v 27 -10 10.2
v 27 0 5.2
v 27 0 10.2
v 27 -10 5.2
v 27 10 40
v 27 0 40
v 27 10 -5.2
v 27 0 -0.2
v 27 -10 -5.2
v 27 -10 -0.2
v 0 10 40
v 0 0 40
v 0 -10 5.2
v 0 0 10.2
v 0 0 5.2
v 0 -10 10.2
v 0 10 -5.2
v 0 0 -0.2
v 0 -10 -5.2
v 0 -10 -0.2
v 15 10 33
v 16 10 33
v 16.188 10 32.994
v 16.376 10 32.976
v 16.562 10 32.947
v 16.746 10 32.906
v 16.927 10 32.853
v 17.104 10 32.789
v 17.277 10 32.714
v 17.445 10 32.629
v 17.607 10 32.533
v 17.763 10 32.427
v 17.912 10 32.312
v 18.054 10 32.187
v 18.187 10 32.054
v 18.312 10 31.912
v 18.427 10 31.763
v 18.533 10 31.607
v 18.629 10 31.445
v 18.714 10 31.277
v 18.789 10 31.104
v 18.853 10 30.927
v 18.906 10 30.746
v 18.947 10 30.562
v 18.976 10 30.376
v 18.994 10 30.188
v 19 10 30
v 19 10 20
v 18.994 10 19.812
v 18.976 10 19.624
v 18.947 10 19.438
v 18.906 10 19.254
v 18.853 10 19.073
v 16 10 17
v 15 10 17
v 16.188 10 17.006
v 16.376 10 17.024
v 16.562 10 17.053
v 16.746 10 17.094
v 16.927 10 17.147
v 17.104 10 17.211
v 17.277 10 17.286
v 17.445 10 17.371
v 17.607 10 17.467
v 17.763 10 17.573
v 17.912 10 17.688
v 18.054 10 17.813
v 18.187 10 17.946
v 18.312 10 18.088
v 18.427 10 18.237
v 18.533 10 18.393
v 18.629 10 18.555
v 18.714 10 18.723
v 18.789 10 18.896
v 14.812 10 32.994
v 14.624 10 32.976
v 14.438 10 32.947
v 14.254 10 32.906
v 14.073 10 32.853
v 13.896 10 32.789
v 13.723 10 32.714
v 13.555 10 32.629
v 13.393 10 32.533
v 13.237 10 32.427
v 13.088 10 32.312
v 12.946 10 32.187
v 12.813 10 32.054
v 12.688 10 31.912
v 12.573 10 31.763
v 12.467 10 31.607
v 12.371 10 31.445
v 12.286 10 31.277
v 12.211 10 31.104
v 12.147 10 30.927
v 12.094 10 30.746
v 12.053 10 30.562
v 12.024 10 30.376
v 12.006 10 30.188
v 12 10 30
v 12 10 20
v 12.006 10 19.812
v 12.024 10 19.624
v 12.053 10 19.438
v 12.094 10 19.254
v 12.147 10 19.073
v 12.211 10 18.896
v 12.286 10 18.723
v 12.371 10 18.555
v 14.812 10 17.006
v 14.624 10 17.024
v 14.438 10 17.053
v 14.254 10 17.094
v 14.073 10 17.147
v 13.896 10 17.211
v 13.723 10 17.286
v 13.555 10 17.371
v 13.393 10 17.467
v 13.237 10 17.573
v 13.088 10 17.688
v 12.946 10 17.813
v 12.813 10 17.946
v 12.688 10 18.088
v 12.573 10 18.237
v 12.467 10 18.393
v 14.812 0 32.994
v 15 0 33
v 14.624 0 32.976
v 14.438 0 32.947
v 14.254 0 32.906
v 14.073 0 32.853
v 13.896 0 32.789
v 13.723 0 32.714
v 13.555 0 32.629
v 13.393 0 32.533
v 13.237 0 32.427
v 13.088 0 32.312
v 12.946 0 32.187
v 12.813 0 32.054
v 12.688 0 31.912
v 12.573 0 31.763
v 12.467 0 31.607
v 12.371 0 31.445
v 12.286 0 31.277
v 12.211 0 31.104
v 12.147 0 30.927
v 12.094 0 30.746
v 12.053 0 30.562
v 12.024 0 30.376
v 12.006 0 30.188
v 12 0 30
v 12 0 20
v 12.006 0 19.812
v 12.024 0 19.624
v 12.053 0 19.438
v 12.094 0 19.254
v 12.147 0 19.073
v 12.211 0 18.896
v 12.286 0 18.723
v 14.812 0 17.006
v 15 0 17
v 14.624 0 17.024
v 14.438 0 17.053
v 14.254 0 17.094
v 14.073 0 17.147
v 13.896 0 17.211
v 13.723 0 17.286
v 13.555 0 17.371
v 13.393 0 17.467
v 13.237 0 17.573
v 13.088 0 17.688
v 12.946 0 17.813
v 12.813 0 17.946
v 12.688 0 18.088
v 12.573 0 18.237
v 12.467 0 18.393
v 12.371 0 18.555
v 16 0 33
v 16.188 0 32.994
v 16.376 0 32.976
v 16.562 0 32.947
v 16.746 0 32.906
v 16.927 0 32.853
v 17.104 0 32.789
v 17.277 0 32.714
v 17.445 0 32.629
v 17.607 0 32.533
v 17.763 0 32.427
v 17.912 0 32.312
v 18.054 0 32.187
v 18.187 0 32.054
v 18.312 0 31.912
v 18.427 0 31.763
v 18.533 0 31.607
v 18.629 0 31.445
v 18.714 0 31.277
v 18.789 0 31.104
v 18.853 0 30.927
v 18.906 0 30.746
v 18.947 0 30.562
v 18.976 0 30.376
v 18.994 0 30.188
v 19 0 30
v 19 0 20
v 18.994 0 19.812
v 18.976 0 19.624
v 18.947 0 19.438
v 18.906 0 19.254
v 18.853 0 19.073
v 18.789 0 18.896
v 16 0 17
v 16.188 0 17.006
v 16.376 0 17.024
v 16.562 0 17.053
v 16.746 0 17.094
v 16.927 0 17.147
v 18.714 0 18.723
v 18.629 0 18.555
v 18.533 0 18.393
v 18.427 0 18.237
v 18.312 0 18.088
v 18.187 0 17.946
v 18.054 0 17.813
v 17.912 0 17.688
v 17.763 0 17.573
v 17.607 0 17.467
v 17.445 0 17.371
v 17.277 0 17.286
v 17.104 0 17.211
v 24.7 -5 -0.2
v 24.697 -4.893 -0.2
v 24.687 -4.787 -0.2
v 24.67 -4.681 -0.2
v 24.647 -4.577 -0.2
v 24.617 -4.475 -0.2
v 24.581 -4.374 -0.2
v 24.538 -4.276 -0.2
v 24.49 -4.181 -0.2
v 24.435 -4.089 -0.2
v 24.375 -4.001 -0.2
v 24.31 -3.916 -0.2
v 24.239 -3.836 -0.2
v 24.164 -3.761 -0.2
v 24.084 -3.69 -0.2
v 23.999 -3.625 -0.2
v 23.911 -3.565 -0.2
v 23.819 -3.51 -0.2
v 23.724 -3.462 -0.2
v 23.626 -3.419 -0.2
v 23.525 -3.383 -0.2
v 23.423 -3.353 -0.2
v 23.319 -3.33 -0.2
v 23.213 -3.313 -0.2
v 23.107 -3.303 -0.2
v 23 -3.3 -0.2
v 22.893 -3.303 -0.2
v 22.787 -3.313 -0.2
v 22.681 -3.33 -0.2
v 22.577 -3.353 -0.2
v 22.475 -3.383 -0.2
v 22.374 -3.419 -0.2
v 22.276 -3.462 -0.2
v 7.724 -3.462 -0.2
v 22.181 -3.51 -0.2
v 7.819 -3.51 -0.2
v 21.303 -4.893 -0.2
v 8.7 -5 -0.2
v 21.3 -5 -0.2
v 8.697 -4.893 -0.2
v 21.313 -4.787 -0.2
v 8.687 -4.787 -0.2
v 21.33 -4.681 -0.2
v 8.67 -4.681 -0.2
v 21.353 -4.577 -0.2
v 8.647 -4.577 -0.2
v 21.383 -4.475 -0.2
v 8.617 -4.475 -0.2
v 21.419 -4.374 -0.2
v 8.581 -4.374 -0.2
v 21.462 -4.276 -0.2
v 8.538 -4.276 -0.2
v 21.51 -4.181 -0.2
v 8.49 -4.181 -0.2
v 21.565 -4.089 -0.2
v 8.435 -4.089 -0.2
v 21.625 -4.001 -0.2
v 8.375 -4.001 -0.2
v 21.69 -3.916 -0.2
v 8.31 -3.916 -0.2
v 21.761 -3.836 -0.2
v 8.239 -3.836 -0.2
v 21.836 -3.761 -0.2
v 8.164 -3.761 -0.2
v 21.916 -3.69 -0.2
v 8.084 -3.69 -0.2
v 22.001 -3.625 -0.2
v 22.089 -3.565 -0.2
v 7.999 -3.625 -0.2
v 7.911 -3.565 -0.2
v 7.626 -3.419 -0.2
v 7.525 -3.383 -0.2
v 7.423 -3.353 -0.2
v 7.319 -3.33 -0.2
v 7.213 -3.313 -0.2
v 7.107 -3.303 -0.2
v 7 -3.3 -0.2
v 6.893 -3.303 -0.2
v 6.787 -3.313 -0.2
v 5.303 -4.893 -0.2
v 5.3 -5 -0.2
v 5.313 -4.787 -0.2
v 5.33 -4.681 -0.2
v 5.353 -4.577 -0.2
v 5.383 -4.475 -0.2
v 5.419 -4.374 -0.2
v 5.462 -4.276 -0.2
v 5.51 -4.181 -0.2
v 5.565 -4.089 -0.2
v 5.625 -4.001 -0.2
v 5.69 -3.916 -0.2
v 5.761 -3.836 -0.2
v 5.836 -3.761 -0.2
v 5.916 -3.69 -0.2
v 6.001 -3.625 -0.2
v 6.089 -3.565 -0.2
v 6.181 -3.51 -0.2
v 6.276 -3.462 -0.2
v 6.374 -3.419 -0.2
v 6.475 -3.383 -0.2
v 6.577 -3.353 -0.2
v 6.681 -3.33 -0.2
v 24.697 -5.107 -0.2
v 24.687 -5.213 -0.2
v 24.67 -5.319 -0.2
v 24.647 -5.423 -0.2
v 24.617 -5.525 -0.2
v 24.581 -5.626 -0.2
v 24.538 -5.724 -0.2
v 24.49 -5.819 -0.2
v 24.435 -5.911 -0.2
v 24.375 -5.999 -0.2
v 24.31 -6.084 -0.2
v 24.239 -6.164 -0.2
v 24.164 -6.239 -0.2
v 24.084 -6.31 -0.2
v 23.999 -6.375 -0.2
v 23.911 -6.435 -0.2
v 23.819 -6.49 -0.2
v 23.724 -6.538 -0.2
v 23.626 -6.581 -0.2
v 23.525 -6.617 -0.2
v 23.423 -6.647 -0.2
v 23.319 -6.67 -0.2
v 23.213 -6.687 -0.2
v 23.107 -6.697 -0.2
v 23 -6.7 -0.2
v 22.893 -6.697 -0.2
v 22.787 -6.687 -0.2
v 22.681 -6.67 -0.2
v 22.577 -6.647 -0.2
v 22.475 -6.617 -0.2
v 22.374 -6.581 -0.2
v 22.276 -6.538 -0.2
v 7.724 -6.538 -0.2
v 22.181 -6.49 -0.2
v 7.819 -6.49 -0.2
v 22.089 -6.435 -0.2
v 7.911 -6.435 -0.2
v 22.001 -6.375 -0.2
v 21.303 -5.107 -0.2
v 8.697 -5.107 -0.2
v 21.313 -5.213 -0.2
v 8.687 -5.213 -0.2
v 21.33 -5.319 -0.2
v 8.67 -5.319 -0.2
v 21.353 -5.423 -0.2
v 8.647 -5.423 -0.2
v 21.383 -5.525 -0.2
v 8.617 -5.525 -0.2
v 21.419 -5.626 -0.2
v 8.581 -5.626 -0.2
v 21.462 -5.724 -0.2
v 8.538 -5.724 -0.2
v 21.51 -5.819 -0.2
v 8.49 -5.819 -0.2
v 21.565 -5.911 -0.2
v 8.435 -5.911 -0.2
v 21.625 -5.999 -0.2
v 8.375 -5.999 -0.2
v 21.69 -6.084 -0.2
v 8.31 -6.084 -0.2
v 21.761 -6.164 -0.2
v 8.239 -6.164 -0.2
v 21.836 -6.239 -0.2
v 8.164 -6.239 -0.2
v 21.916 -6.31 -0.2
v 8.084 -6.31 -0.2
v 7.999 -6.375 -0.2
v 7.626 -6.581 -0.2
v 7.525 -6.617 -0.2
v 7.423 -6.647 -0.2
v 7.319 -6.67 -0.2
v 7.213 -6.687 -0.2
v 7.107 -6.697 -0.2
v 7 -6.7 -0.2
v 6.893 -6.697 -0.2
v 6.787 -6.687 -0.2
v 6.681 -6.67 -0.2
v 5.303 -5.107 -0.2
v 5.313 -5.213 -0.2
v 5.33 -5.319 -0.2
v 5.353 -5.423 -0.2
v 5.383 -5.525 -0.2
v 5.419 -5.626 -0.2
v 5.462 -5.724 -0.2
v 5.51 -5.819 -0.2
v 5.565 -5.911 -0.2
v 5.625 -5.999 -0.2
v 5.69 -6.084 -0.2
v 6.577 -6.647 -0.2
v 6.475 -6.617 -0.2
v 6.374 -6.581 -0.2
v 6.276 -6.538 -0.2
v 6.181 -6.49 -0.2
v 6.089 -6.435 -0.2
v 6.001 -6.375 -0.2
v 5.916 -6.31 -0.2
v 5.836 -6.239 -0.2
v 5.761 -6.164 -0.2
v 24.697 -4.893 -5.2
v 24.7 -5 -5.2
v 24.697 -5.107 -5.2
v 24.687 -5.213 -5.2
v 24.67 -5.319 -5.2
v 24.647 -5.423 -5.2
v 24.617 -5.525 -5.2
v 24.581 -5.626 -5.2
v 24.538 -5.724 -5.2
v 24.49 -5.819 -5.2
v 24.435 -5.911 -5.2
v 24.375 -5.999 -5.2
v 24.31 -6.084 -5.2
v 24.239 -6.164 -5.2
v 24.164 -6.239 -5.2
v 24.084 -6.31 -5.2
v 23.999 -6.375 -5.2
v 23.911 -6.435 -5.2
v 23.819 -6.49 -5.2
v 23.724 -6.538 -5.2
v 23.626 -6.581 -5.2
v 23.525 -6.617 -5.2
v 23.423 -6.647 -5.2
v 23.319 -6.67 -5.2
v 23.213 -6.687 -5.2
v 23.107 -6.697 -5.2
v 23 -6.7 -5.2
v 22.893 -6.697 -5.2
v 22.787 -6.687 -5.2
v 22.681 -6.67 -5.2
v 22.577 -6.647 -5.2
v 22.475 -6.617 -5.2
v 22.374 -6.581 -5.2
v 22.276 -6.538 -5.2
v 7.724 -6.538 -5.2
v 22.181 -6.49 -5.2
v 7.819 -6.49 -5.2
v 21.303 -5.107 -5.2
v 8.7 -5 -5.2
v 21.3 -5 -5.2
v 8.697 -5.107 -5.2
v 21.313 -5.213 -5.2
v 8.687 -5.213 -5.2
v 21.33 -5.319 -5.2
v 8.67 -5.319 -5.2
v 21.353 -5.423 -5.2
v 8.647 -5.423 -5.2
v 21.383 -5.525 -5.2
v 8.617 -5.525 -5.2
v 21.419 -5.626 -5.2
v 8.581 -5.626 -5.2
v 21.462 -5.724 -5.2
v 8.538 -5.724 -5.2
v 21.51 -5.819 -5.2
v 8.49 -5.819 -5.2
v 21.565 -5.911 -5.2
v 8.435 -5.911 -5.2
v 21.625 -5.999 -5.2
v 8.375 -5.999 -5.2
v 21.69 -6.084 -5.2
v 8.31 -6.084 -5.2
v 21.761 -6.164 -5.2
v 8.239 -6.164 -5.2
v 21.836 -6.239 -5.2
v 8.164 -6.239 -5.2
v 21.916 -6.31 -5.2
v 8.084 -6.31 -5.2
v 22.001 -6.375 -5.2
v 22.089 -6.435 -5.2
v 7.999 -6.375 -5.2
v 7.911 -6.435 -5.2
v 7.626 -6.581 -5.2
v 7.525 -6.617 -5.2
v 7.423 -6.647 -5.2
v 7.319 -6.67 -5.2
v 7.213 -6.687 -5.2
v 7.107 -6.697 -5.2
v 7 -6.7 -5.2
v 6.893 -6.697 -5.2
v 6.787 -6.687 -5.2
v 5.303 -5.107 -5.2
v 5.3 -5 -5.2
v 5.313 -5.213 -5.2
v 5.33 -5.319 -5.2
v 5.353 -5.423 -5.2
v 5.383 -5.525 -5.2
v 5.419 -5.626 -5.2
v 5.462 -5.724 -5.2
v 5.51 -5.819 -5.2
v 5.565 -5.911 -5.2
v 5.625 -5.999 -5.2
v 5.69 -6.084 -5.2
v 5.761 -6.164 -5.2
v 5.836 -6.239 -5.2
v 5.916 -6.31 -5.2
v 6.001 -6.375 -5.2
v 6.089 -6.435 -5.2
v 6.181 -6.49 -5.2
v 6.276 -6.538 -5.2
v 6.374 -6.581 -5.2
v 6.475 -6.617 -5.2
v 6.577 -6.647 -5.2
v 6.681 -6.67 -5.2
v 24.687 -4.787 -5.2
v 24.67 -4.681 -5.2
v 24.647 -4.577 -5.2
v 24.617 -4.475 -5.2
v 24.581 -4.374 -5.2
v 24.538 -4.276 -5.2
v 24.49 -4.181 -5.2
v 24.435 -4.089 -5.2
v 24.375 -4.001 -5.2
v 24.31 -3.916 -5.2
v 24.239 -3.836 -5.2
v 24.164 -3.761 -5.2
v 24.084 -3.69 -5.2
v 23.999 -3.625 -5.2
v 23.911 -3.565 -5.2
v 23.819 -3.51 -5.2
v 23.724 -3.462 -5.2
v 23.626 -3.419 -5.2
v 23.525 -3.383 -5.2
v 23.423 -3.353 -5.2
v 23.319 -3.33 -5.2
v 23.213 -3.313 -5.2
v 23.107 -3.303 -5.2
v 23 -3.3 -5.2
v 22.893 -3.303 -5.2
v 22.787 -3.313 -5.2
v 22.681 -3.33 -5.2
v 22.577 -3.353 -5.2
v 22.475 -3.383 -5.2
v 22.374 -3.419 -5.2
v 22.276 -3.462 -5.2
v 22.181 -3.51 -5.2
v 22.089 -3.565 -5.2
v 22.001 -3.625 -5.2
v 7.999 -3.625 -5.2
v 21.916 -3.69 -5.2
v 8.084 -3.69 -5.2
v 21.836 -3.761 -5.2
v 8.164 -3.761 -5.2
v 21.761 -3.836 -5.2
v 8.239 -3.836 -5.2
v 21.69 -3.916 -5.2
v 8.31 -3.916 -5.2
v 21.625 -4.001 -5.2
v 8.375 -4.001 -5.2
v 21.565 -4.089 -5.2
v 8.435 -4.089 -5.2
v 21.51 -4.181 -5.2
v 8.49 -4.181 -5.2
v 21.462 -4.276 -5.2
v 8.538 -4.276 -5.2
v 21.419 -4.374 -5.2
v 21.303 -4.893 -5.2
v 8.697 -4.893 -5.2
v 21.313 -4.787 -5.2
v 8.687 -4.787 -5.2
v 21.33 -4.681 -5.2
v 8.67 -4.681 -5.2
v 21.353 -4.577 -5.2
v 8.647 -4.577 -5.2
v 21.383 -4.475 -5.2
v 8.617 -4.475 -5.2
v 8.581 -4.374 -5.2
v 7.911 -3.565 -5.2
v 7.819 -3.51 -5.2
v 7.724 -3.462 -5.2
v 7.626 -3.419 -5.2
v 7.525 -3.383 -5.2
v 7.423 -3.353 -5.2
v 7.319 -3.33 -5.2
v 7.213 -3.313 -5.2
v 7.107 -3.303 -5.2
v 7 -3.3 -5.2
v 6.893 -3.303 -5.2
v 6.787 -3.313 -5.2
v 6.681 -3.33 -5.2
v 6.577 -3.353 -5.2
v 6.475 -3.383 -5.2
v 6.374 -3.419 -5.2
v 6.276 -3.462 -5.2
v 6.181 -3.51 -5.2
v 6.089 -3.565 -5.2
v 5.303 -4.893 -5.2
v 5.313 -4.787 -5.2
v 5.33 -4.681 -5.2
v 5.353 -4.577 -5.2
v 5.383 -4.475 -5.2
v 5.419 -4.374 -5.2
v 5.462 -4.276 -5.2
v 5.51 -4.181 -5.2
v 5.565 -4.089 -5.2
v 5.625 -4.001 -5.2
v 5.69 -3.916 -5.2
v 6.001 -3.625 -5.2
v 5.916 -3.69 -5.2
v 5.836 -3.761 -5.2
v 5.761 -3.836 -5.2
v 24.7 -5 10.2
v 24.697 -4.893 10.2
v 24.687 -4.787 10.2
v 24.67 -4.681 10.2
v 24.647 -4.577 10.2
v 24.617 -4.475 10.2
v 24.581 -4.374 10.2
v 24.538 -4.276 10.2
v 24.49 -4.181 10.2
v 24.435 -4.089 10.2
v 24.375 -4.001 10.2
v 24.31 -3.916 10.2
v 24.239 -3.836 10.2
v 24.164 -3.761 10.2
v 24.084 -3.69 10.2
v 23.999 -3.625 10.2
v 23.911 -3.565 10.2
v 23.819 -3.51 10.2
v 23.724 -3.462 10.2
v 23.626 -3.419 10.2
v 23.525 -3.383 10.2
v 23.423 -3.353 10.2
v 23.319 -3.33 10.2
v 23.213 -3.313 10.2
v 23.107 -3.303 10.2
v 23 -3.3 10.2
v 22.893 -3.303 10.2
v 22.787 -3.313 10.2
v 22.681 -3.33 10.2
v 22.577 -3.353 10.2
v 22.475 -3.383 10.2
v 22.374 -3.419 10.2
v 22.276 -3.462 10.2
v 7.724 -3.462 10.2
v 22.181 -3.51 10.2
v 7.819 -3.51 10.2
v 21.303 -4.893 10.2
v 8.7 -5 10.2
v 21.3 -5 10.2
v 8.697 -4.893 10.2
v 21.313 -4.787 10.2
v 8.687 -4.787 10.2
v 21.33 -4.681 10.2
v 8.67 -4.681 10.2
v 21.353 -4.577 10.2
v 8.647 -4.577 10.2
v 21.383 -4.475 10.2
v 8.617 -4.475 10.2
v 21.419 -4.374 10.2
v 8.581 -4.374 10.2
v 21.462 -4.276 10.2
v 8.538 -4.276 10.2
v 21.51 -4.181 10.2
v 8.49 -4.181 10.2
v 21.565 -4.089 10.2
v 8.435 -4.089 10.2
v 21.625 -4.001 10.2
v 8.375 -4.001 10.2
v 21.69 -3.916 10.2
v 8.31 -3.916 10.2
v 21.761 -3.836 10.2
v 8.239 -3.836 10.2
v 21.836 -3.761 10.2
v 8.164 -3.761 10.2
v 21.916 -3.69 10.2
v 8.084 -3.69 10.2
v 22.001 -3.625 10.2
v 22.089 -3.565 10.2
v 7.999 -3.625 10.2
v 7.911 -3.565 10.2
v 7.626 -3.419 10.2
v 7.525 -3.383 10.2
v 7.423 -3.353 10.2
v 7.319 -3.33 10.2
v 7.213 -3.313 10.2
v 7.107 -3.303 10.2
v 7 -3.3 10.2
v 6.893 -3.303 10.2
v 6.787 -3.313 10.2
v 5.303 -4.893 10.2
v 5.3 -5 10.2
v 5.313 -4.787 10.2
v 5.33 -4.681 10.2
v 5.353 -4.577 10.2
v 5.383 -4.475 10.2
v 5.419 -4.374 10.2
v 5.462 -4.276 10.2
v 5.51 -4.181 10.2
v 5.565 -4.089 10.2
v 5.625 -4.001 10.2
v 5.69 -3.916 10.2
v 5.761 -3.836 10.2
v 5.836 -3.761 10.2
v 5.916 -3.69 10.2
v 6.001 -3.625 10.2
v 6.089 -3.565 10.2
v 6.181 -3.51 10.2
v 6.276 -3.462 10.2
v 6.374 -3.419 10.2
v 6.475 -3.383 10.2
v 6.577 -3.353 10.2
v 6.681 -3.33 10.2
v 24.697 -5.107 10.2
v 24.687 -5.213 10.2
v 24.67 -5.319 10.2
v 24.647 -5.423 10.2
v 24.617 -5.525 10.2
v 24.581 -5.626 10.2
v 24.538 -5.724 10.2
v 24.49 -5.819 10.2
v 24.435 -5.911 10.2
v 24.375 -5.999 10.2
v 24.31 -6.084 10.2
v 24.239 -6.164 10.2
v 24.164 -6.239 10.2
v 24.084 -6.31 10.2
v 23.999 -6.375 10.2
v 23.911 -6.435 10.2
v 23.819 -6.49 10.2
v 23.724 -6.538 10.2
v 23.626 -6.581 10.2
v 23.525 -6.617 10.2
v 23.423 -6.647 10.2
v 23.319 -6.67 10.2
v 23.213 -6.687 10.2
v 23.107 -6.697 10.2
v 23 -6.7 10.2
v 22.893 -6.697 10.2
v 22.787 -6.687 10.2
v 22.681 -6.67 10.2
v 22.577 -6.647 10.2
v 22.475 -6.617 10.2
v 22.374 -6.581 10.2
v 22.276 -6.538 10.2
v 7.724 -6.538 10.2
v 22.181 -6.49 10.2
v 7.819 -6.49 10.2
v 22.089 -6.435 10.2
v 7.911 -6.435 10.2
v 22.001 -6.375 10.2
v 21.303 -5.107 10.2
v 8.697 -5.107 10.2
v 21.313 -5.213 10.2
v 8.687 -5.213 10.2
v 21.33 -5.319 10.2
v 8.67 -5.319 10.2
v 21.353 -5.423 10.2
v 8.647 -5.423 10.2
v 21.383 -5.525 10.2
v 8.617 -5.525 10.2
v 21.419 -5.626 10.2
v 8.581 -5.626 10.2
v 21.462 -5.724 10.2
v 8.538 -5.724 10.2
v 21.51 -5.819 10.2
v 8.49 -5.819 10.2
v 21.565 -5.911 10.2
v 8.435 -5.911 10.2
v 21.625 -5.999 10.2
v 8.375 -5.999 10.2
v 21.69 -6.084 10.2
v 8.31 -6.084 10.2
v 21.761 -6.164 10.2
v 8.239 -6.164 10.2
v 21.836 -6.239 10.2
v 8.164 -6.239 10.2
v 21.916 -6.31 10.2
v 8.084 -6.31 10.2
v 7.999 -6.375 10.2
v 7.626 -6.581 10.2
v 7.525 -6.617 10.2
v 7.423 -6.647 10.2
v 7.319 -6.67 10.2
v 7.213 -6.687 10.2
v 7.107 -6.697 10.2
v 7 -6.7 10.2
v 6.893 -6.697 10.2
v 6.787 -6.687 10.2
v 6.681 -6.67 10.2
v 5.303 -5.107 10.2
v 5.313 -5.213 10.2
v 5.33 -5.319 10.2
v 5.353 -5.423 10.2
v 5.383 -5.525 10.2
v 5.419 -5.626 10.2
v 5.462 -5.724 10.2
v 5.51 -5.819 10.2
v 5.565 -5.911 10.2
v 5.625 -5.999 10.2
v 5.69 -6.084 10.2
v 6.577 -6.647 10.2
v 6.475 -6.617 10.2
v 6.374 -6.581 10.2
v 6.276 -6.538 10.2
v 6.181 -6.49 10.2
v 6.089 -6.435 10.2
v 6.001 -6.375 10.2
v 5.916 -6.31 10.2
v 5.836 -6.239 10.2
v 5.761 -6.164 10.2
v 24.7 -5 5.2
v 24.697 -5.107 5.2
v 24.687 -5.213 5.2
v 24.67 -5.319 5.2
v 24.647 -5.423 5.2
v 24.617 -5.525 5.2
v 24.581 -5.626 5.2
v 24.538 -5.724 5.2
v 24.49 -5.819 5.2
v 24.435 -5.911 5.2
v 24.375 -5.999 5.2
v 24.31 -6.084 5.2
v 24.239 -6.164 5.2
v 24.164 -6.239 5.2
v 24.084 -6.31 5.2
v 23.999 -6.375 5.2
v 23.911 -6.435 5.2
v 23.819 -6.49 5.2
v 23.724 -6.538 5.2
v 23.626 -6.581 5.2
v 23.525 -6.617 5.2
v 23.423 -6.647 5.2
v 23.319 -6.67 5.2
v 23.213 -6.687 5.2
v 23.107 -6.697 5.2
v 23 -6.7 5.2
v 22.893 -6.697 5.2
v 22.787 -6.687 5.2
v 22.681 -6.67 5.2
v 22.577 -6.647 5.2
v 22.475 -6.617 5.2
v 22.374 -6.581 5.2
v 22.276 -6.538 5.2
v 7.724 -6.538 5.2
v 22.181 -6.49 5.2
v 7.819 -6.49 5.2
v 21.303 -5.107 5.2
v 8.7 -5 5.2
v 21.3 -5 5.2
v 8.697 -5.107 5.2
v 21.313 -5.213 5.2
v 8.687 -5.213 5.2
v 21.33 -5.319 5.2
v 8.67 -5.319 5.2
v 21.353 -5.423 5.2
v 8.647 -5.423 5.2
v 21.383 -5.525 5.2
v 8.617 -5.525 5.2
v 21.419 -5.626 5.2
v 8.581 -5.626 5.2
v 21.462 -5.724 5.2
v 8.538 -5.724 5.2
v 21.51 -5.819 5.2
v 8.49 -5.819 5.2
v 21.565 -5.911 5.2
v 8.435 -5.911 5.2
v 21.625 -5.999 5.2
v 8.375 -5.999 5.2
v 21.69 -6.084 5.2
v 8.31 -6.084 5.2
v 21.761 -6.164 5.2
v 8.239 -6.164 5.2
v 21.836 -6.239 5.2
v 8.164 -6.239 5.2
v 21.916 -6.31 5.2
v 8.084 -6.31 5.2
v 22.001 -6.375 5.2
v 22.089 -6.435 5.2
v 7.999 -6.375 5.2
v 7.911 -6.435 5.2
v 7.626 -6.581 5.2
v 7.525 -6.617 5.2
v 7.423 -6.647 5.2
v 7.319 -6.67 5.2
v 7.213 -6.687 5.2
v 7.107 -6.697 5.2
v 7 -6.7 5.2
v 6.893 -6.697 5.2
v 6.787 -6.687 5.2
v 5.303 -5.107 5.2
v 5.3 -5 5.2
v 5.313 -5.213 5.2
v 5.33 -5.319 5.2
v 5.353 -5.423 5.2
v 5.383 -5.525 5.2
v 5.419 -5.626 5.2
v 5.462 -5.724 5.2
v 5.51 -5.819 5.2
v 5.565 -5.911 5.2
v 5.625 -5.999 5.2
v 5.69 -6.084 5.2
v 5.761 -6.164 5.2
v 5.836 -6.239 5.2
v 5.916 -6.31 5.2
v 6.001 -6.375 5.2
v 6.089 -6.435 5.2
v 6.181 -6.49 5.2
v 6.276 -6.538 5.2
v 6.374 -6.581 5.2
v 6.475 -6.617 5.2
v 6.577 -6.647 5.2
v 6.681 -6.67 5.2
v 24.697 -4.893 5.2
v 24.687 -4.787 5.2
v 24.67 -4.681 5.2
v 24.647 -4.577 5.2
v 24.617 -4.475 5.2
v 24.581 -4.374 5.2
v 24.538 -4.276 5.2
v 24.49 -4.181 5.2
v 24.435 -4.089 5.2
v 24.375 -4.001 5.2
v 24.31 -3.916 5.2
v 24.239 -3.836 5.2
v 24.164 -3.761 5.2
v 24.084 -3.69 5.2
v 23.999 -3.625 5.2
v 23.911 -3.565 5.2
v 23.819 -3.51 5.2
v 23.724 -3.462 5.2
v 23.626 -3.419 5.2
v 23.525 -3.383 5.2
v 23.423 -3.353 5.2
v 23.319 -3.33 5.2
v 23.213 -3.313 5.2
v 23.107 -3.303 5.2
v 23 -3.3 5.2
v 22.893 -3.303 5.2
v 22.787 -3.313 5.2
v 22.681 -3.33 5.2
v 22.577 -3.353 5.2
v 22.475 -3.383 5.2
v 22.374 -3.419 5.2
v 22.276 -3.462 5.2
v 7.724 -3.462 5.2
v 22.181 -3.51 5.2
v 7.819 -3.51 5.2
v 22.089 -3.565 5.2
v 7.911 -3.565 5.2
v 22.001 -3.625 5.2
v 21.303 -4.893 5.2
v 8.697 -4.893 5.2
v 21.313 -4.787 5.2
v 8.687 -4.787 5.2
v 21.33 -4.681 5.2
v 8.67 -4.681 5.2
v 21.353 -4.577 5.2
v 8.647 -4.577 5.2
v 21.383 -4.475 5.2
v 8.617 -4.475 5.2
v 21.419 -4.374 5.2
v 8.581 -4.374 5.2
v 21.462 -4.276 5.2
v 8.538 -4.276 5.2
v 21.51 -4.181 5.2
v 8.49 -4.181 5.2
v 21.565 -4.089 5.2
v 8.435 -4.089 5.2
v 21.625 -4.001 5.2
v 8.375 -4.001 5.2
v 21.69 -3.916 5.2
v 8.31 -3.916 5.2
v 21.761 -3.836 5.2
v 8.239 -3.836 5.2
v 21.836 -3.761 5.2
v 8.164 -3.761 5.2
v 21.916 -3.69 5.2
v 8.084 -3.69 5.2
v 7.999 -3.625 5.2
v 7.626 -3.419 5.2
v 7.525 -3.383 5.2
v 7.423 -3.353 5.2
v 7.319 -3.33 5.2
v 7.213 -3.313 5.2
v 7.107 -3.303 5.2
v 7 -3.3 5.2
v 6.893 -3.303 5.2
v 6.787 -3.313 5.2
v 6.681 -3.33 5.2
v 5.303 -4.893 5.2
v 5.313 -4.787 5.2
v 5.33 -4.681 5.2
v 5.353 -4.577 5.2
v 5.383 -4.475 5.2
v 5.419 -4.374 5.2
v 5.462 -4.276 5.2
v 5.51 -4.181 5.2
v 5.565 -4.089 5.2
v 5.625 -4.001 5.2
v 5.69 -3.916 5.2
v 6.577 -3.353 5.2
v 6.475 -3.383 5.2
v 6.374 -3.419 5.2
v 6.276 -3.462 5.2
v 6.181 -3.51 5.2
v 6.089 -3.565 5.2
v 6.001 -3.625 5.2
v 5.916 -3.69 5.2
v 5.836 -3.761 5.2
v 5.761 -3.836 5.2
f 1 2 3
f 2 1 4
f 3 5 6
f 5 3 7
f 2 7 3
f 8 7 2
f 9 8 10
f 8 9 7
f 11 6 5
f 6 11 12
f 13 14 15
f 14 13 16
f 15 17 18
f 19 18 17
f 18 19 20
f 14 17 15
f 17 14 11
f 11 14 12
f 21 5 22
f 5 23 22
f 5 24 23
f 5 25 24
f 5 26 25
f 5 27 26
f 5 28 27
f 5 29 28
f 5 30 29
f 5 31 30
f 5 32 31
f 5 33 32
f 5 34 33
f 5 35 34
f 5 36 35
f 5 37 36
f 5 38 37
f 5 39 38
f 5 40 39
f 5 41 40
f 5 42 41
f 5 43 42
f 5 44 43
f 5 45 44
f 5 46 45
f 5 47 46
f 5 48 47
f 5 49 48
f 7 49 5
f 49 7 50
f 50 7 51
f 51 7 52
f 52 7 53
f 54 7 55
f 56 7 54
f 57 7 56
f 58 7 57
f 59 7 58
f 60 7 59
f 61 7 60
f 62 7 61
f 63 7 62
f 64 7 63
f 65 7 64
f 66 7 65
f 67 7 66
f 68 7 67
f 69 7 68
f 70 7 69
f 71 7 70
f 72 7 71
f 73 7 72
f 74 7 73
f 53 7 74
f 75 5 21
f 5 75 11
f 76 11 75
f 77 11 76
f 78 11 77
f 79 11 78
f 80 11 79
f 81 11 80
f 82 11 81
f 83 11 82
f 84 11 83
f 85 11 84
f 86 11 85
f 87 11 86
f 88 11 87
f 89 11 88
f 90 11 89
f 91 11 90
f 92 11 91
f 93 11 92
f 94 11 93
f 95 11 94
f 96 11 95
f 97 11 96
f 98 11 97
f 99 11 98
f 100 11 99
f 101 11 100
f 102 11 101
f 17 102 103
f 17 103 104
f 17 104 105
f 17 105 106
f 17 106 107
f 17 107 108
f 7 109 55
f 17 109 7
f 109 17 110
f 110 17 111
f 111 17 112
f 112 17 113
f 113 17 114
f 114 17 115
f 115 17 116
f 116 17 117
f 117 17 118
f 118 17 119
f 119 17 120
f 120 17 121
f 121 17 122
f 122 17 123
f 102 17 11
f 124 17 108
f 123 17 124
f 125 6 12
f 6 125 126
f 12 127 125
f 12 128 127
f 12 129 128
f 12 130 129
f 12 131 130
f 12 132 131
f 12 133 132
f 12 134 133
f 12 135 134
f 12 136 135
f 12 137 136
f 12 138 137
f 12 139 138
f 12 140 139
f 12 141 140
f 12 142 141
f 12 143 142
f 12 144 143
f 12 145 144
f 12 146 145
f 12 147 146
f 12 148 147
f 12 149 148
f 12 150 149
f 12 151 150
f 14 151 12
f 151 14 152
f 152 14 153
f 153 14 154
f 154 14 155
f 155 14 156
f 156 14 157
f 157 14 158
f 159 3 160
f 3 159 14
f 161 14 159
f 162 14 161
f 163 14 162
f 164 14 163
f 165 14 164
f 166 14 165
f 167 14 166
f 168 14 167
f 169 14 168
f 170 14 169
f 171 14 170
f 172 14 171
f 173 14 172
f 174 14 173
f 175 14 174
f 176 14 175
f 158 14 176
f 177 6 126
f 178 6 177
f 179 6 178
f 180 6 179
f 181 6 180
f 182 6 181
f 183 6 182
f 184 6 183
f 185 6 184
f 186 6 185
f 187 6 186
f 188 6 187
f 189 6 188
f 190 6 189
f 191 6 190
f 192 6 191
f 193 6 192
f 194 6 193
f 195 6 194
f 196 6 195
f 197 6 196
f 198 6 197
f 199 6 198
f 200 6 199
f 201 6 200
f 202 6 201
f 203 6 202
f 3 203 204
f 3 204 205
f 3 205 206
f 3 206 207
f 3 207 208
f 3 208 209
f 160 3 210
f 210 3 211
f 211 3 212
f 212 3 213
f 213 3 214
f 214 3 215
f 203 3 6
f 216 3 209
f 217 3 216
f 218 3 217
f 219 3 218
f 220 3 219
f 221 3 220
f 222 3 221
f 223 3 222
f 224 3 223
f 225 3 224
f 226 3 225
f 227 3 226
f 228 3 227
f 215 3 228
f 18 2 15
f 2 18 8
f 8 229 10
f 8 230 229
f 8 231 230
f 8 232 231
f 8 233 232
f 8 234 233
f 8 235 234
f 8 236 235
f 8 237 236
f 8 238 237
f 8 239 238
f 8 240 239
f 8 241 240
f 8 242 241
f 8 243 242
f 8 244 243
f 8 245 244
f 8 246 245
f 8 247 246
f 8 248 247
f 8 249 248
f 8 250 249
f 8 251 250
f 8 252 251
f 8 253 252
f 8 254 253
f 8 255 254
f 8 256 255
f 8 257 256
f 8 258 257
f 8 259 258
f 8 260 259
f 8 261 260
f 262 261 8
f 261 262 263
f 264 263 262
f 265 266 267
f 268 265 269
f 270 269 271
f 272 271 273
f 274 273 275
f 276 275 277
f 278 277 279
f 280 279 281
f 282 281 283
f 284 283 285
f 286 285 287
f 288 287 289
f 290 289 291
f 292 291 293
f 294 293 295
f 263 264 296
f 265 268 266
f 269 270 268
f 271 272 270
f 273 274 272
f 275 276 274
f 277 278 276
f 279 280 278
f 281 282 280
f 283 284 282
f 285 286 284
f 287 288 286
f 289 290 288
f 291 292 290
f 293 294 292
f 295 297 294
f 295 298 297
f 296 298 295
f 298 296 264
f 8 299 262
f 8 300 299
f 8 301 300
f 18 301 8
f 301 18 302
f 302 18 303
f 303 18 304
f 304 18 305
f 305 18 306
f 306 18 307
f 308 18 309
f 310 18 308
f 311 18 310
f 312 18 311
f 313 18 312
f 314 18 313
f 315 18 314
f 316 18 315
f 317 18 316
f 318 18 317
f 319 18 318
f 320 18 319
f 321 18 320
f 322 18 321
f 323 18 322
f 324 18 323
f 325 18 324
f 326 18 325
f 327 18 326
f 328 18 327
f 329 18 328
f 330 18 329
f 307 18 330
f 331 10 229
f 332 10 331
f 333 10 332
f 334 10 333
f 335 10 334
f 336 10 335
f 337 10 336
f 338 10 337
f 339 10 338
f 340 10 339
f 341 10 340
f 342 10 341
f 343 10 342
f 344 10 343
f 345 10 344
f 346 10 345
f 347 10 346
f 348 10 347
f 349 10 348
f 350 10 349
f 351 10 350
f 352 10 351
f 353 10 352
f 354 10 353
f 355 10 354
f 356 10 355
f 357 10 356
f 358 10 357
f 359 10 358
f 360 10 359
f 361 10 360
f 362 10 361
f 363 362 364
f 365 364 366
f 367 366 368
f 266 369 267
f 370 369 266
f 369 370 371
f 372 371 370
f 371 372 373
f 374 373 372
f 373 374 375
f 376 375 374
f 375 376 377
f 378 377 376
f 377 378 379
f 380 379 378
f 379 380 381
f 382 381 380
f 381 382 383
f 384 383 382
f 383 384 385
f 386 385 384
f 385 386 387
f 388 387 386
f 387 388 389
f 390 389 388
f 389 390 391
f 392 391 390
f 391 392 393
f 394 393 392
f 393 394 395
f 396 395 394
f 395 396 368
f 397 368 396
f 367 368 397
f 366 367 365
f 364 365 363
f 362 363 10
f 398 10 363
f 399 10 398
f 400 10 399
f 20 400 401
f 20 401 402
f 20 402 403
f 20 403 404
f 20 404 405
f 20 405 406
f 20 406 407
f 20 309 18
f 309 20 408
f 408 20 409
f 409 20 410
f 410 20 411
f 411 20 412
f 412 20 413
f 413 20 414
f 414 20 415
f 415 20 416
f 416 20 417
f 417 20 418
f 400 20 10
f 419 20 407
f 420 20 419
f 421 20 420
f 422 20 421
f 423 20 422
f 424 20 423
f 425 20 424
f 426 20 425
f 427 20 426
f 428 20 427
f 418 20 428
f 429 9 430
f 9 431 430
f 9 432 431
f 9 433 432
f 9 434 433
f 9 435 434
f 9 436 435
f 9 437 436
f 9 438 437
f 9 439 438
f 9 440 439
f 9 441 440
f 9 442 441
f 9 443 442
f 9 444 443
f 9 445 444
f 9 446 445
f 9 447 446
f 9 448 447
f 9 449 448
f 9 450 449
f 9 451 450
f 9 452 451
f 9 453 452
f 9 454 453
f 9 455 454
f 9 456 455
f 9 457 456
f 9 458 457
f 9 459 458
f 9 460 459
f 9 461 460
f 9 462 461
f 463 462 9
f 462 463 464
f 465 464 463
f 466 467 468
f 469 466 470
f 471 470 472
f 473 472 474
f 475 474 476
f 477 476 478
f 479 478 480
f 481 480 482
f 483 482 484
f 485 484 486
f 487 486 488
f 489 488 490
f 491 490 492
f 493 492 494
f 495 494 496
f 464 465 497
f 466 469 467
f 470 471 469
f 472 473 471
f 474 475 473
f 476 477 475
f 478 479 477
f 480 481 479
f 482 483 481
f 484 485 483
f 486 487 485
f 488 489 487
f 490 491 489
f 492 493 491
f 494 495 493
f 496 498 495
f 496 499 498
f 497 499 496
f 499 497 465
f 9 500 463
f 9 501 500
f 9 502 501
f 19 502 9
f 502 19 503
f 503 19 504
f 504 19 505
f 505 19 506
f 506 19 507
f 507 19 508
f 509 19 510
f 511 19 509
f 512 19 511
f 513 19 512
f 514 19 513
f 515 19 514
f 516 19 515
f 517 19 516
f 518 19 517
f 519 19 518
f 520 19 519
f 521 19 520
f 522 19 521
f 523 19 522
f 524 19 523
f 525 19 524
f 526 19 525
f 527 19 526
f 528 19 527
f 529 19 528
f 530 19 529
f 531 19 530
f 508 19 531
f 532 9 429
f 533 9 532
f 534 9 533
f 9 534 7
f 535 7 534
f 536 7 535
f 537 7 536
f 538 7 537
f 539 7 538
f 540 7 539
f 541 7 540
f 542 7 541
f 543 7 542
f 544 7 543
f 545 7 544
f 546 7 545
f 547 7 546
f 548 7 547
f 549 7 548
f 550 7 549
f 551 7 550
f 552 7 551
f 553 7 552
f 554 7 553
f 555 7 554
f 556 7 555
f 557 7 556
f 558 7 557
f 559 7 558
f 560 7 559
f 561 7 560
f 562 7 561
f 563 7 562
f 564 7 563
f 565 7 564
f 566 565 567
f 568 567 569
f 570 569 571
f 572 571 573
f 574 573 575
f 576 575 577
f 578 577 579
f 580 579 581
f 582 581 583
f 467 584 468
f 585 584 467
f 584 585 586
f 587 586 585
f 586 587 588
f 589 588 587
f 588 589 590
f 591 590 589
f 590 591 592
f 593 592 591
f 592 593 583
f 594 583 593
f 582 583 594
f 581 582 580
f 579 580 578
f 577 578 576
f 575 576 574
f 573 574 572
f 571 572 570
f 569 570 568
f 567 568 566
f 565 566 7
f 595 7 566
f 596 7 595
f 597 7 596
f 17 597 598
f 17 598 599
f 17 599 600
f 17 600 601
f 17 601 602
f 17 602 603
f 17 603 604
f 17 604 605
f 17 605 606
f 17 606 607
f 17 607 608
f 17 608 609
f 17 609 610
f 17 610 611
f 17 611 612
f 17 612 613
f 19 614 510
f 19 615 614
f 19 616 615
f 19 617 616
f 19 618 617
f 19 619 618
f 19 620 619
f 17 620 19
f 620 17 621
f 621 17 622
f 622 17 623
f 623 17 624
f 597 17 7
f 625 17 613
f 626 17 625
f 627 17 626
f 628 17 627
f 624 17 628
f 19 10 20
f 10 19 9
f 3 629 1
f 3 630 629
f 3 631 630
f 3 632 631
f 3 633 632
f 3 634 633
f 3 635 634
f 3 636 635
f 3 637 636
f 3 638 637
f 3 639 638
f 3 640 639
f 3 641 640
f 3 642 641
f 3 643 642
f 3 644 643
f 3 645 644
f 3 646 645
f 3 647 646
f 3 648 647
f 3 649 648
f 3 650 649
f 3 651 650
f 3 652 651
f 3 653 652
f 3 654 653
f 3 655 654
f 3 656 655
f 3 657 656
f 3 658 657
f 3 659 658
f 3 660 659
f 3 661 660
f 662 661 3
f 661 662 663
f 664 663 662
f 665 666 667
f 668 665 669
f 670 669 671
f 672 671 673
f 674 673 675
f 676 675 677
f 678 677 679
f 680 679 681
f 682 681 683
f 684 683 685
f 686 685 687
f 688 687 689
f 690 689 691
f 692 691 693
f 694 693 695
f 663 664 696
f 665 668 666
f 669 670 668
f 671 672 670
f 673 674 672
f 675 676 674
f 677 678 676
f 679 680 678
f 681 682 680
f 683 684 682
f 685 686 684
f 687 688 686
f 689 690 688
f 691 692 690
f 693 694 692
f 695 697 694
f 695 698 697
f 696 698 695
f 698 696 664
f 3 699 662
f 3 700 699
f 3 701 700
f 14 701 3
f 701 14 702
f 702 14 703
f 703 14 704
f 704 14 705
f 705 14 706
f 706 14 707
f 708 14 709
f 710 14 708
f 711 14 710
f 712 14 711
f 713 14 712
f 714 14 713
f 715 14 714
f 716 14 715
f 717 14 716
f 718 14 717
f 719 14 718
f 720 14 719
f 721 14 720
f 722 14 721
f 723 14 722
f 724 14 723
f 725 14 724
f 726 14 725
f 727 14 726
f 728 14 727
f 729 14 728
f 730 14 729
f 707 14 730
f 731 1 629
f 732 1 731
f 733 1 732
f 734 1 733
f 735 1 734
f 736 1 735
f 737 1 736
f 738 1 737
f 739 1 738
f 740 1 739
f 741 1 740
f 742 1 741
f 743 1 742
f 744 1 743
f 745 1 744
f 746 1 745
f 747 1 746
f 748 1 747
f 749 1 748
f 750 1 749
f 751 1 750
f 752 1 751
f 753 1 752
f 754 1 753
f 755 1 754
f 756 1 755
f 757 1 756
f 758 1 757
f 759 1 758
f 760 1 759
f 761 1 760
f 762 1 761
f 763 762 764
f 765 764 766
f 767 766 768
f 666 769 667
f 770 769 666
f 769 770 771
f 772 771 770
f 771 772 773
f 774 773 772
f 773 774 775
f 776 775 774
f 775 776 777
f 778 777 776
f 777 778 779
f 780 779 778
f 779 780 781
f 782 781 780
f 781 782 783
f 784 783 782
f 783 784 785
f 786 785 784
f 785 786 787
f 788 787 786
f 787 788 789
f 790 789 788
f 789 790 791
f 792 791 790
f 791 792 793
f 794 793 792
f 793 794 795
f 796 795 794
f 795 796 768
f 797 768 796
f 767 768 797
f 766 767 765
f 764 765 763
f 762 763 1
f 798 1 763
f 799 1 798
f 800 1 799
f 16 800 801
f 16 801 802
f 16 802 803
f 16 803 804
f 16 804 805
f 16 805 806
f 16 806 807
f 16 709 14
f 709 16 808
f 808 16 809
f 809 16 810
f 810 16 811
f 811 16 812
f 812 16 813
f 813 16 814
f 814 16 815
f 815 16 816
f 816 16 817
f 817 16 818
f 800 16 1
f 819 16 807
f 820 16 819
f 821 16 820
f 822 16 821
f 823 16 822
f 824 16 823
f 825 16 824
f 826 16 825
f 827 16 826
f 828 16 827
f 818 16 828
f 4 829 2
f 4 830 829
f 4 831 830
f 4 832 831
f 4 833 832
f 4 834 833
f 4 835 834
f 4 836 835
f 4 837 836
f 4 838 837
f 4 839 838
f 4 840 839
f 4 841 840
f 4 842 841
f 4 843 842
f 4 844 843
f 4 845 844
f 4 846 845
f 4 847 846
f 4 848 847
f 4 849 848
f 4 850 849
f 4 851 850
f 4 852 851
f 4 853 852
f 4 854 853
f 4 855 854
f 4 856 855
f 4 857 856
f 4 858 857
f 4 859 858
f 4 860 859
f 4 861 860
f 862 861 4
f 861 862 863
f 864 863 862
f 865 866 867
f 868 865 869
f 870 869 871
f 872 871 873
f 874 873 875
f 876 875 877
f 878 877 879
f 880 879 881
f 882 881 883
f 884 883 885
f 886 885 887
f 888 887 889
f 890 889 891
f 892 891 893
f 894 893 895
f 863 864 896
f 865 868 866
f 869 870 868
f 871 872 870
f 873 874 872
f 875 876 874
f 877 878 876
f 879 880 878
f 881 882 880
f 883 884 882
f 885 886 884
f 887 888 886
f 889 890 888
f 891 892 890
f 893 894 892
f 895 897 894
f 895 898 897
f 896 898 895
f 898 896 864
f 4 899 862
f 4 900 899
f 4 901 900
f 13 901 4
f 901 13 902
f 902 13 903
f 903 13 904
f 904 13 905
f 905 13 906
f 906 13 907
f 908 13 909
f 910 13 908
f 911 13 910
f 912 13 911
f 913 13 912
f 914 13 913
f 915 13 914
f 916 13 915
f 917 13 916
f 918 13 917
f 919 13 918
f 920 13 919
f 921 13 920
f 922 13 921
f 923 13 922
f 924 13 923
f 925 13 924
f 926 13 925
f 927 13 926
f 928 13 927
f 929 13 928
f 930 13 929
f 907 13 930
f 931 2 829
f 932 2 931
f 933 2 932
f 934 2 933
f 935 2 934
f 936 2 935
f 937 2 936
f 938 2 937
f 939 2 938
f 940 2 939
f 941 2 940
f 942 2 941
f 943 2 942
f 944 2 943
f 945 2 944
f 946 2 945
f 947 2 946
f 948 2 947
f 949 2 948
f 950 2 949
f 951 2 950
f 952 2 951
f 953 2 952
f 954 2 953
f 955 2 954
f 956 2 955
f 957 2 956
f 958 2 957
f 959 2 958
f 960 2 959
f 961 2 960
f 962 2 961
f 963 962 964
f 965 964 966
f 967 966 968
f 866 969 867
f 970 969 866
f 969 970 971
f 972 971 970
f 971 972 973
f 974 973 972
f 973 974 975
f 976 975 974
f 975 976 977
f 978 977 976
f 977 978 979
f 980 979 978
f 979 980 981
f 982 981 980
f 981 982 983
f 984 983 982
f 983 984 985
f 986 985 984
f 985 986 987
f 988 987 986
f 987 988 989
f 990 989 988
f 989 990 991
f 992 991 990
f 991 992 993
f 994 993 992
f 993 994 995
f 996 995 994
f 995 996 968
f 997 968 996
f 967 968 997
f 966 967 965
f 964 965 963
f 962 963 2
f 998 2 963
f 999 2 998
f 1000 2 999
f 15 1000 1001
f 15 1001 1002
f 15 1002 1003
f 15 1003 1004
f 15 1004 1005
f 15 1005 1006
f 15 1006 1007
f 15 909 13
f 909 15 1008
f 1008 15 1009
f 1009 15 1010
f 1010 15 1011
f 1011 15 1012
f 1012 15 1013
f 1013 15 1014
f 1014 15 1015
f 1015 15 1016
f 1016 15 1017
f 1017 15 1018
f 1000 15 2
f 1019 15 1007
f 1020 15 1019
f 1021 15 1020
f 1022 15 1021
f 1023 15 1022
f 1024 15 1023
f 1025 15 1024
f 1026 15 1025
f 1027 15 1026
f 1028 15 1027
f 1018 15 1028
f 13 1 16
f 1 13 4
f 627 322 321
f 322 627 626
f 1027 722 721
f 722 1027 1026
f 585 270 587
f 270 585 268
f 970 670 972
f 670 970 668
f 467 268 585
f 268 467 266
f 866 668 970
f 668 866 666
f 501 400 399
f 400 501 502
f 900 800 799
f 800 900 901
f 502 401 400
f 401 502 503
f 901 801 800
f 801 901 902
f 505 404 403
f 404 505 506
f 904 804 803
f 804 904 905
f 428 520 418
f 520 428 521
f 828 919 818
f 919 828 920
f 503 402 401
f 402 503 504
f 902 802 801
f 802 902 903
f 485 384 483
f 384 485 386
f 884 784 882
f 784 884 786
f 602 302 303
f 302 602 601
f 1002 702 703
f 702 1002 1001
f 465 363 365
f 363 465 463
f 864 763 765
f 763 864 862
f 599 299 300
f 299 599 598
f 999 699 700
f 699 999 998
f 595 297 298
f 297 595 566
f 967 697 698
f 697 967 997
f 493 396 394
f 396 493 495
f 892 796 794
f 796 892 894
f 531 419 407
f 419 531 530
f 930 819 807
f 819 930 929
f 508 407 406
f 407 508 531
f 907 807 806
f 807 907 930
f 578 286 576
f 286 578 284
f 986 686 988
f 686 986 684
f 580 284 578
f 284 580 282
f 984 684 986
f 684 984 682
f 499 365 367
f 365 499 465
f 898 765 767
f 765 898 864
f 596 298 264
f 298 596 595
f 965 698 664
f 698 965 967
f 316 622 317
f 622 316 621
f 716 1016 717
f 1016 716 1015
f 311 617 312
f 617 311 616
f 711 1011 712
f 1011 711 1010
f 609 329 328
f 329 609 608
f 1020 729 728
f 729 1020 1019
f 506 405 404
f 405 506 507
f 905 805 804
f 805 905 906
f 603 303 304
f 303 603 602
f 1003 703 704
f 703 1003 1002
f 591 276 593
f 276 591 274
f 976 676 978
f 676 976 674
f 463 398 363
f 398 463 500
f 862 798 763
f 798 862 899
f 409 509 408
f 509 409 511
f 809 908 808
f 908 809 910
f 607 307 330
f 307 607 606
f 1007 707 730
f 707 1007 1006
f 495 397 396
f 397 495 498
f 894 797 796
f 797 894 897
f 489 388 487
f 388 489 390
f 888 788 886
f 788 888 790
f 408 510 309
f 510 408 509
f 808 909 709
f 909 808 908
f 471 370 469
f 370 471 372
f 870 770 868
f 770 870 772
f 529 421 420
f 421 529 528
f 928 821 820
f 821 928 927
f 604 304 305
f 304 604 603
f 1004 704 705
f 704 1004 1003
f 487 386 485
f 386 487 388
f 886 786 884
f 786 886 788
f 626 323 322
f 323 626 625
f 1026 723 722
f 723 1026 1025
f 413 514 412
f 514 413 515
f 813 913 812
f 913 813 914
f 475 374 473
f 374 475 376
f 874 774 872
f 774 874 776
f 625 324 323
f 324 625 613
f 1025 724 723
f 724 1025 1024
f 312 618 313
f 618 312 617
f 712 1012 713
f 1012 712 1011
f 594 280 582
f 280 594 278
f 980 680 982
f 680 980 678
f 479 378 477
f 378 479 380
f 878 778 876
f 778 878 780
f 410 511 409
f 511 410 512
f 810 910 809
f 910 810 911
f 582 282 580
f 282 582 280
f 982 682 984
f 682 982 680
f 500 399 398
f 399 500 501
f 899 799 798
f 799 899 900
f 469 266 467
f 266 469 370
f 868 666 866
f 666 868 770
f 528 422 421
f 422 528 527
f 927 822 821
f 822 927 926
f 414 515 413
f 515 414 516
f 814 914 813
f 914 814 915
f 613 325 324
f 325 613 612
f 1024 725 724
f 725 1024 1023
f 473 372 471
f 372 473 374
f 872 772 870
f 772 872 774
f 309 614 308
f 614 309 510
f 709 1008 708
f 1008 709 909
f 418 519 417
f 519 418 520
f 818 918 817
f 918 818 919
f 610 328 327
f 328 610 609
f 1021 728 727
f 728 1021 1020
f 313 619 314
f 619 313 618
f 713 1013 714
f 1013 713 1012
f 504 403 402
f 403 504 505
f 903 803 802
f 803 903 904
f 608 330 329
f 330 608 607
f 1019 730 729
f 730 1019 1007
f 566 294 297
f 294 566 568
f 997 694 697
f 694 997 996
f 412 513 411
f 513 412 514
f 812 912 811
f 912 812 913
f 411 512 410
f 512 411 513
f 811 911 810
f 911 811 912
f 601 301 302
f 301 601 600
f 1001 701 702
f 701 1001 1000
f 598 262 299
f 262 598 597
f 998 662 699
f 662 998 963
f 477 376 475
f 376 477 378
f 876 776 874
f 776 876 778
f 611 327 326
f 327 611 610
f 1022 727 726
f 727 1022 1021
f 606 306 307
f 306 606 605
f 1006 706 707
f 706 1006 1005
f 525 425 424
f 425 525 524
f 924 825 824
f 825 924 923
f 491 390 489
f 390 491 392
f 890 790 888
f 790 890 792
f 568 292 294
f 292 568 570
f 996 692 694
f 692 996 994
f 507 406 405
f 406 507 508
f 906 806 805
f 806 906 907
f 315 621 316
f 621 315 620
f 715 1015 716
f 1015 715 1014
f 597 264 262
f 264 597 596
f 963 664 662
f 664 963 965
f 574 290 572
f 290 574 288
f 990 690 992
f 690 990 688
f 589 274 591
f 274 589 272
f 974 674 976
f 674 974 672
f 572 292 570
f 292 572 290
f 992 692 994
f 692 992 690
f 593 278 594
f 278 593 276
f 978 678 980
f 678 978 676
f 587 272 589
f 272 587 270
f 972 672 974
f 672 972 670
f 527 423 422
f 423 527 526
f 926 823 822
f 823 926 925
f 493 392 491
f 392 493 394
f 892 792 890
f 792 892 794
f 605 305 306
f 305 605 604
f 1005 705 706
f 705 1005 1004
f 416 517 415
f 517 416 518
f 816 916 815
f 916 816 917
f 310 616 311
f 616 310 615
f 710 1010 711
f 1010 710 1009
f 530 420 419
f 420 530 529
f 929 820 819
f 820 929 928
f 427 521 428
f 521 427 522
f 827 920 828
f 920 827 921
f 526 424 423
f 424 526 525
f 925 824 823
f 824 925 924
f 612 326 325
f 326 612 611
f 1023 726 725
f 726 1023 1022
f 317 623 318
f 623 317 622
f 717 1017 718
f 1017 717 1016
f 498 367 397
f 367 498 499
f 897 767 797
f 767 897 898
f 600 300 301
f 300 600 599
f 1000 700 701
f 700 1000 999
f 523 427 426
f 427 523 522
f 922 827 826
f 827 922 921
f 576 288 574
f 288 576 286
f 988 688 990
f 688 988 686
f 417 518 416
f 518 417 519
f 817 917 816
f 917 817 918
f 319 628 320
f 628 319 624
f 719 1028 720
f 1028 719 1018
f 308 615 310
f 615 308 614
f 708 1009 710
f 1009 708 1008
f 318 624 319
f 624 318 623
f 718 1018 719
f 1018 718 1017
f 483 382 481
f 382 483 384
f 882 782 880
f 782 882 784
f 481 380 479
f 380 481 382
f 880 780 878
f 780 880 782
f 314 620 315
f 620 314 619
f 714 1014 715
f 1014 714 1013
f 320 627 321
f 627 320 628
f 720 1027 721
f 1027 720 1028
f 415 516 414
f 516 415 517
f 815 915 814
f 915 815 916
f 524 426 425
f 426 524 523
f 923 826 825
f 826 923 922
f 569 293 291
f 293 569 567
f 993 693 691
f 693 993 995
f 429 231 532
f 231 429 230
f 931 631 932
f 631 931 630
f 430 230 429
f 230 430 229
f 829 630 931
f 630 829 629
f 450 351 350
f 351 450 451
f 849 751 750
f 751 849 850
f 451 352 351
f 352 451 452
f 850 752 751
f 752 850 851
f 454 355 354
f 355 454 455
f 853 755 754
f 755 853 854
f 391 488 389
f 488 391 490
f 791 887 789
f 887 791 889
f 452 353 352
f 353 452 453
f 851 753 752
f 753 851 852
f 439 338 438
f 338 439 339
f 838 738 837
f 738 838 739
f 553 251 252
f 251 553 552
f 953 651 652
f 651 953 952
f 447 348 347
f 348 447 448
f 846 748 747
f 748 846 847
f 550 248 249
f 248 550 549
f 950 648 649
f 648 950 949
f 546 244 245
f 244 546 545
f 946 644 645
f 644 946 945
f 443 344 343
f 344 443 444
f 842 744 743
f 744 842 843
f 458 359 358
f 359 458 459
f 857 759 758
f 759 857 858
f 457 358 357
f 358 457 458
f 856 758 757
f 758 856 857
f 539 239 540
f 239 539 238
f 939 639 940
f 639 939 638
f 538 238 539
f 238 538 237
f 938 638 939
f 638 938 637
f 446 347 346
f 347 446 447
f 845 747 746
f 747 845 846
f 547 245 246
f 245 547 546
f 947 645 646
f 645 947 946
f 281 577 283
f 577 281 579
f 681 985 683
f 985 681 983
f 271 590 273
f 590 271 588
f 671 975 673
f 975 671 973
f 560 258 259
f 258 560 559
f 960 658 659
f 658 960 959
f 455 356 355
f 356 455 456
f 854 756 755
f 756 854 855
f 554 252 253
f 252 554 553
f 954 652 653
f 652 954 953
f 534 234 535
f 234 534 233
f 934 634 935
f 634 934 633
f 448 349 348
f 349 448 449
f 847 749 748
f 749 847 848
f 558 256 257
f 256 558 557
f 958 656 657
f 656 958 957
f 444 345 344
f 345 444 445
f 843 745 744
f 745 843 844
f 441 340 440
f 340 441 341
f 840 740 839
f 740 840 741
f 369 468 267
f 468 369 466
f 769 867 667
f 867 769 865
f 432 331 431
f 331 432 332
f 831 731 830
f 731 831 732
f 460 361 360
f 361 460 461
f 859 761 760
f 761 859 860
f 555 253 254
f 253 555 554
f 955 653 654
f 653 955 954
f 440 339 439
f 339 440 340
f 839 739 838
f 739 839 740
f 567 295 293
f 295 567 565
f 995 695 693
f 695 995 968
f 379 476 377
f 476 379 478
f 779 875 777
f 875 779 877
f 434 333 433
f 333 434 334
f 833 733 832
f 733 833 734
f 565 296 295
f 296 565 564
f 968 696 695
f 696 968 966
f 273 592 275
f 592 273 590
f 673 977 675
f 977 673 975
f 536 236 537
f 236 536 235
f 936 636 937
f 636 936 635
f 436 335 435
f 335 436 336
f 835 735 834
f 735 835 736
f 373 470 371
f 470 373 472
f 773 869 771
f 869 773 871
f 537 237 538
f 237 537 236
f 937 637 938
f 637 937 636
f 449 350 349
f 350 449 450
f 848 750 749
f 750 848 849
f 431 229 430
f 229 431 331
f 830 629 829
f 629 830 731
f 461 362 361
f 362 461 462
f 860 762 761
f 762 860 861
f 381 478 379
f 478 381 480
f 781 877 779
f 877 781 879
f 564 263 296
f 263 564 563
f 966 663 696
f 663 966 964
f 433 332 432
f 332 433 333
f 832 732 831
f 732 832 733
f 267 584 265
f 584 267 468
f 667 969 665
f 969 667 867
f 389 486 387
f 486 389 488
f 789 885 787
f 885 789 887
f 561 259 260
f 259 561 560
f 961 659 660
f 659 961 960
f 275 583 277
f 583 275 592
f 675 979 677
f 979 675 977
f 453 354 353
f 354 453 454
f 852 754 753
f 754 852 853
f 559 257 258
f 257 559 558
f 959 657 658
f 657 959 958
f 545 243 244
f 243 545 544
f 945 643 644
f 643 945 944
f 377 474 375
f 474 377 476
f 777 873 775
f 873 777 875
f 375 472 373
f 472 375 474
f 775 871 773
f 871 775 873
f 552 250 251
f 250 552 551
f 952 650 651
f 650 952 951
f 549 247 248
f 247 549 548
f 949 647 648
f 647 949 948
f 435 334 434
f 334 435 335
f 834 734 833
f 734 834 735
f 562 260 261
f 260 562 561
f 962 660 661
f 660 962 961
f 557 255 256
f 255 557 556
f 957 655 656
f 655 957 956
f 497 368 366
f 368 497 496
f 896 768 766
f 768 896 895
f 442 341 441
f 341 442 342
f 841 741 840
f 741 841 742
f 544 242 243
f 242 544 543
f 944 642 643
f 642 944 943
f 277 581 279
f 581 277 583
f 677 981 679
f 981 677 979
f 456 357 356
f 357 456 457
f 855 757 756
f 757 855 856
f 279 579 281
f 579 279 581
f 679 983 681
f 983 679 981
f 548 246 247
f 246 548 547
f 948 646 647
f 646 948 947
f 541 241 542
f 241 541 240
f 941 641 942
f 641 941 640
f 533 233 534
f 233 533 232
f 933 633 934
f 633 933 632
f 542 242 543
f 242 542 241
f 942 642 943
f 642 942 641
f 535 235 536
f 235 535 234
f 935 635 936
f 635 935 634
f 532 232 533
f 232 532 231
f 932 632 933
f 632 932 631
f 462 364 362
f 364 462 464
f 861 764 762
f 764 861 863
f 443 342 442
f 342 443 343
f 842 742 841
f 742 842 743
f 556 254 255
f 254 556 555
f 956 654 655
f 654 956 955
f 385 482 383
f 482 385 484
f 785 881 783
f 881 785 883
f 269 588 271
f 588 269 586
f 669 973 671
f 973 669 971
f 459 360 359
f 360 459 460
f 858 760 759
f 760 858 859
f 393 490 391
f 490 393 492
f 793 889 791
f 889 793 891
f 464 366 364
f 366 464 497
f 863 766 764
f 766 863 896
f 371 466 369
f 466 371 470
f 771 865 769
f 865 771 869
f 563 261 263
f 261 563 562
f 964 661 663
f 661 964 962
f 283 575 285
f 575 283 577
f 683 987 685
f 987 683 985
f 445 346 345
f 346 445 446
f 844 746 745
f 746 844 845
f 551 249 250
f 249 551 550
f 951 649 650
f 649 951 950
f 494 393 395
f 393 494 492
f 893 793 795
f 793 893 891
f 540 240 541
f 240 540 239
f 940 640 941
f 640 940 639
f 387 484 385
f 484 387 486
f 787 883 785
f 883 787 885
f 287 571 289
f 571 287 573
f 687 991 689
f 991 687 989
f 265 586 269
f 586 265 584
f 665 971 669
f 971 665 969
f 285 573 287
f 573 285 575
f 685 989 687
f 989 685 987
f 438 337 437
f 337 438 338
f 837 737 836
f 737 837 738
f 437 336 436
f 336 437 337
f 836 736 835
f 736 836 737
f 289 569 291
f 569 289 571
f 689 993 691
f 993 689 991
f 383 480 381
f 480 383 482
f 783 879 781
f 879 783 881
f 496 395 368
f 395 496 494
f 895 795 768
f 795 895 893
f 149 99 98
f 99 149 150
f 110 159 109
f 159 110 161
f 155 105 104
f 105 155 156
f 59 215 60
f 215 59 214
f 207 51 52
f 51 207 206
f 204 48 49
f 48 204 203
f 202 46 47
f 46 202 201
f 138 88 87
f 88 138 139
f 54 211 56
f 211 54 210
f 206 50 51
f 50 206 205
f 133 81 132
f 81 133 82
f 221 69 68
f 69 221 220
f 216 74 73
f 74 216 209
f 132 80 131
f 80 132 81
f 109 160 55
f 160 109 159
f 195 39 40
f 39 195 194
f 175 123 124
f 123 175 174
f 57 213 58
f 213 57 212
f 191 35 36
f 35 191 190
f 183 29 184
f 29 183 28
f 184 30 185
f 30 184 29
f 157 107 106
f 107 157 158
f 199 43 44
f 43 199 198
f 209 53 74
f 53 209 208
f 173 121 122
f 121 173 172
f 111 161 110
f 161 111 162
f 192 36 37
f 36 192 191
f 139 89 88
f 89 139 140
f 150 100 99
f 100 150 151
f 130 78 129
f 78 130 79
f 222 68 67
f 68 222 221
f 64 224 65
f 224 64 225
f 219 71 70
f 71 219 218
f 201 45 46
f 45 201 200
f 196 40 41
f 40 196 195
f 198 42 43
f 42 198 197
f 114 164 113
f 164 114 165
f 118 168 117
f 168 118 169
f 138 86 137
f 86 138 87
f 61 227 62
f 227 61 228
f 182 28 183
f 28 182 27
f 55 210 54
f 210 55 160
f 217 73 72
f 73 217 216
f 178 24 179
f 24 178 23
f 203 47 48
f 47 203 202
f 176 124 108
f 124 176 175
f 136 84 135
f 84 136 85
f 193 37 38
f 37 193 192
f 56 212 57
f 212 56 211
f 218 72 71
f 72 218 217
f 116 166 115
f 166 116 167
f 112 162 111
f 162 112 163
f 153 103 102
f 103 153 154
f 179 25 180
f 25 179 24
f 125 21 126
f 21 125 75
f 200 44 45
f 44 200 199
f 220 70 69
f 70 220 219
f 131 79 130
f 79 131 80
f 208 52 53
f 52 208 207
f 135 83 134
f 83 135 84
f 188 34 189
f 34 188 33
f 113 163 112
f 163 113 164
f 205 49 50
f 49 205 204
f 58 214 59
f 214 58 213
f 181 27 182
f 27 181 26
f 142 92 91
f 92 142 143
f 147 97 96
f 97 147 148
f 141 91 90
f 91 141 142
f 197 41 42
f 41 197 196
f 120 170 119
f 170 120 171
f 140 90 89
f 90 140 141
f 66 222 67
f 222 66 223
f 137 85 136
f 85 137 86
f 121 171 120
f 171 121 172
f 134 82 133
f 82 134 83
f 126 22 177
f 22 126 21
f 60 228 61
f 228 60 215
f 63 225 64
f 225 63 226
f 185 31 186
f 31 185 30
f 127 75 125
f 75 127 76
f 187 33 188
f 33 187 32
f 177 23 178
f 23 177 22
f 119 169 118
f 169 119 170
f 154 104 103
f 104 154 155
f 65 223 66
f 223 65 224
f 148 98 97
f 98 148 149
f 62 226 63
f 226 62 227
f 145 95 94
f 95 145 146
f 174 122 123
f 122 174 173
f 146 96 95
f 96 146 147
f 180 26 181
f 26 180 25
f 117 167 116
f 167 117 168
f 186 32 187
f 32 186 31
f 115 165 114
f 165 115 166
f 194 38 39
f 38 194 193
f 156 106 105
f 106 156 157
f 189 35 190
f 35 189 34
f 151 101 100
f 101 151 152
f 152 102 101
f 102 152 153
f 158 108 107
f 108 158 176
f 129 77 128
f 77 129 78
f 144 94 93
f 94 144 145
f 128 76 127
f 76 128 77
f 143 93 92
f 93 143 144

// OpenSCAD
// file: utils.scad
module drawComponents() {
    difference() {
        union() {
            let ($componentMode = 0) {
                children();
            }
        }

        let ($componentMode = 1) {
            children();
        }
    }

    let ($componentMode = 2) {
        %children();
    }
}
// main file
use <utils.scad>

$fn = 100;

module fix(anti=false, width=30, cutLeft = 0, cutRight = 0) {
    if (!anti) {
        if ($componentMode == 0) {
            translate([cutRight, 0, -1])
                cube([width - cutLeft - cutRight, 10, 41]);

            translate([cutRight, -10, -5.2])
                cube([width - cutLeft - cutRight, 20, 5]);

            translate([cutRight, -10, 5.2])
                cube([width - cutLeft - cutRight, 20, 5]);

        } else if ($componentMode == 1) {
            translate([width / 2, 20, 20])
                rotate([90, 0, 0])
                    minkowski() {
                        cube([1, 10, 1]);
                        cylinder(width, 3, 3);
                    }
        }
    } else {
        if ($componentMode == 1) {
            translate([-0.2, -0.2, -2])
                cube([width + 0.4, width + 0.4, 10]);
        }
    }

    if ($componentMode == 1) {
        translate([7, -5, -6])
            cylinder(17, 1.7, 1.7);

        translate([width - 7, -5, -6])
            cylinder(17, 1.7, 1.7);
    }
}

// drawComponents()
//     fix();

// drawComponents()
//     fix(cutRight=3);

drawComponents()
    fix(cutLeft=3);
